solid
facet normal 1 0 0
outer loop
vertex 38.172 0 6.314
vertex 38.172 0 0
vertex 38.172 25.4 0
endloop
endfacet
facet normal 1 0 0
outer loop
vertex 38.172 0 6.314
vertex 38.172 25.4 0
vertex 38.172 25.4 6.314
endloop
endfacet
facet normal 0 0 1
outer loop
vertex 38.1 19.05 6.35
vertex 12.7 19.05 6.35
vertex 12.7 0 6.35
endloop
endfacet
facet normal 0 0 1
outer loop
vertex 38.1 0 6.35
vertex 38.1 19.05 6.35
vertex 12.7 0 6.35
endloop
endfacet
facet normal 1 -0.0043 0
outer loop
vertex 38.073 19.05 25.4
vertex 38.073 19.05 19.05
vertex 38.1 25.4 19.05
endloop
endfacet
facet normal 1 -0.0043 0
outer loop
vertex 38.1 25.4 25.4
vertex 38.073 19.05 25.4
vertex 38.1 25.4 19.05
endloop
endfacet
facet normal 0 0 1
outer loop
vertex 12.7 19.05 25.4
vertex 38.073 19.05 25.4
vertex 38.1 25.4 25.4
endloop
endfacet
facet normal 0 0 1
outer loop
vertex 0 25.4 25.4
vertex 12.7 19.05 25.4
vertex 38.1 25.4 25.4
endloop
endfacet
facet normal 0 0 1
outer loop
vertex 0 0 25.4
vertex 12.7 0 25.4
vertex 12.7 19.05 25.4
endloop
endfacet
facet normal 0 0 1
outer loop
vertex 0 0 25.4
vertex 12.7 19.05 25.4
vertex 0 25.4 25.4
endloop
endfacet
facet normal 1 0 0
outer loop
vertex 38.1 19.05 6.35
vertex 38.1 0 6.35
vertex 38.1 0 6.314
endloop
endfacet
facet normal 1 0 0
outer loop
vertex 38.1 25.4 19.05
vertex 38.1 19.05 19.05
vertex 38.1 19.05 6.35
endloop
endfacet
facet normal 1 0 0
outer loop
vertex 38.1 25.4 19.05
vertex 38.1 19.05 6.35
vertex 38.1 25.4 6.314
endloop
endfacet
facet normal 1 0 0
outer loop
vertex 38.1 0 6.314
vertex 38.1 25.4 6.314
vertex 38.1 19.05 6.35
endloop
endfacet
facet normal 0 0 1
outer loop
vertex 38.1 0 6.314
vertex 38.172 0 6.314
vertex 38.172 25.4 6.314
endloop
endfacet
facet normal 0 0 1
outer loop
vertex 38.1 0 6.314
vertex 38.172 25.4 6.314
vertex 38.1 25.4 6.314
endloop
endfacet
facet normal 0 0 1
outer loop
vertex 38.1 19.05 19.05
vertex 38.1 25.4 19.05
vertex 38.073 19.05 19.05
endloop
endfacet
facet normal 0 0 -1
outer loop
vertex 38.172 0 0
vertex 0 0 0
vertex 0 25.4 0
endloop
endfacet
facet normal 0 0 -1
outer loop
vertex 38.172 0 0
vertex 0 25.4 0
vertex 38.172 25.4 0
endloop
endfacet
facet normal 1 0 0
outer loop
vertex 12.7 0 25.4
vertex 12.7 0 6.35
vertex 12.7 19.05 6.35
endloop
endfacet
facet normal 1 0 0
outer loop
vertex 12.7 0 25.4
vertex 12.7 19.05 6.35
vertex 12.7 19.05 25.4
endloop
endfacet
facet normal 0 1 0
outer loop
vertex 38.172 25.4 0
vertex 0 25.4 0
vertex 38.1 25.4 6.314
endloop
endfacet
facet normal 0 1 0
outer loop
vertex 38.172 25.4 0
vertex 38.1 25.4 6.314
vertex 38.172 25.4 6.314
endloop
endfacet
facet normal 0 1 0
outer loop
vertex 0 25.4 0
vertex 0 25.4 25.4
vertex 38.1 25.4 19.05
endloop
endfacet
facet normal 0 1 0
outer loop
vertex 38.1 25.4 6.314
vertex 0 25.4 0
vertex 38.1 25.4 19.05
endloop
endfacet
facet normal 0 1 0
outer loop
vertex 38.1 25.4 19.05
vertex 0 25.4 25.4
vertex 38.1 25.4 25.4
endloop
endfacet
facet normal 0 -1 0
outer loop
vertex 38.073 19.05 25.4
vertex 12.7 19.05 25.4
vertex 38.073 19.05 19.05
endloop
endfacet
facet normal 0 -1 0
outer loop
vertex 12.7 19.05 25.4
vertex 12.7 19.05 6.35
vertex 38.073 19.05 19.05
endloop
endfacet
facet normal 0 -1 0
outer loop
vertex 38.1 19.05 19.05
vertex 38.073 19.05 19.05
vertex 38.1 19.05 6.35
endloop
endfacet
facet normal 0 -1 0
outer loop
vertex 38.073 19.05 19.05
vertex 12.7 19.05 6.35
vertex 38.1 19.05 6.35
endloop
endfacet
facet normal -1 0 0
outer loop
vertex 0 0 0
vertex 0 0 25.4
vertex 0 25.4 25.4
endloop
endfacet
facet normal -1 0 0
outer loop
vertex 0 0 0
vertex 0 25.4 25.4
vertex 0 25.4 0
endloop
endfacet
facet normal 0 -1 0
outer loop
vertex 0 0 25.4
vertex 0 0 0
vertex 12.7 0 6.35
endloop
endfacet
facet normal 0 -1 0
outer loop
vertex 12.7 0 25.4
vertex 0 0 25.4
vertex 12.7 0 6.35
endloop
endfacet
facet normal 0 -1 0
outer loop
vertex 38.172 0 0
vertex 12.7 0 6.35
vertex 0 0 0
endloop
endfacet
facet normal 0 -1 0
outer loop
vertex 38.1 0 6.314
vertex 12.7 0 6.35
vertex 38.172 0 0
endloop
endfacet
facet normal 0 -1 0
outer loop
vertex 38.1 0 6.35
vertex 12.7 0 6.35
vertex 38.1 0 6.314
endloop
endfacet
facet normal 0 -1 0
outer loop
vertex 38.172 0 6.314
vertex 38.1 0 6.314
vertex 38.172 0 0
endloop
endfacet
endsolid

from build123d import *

# Parameters (mm, degrees)
F3_DEPTH = 25.4
F4_DEPTH = 38.1
F5_DEPTH = 25.4


with BuildPart() as f3:
    # F0 (on Front) → F3 (new body)
    with BuildSketch(Plane.XZ):
        Polygon((0, 25.4), (0, 0), (38.171803, 0), (38.171803, 6.314098), (12.7, 6.314098), (12.7, 19.05), (12.7, 25.4), align=None)
    extrude(amount=-F3_DEPTH)

    # F1 (on Right) → F4 (join)
    with BuildSketch(Plane.YZ):
        Polygon((0, 6.35), (0, 0), (25.4, 0), (25.4, 19.05), (19.05, 19.05), (19.05, 6.35), align=None)
    extrude(amount=F4_DEPTH)

    # F2 (on Top) → F5 (join)
    with BuildSketch(Plane.XY):
        Polygon((0, 25.4), (0, 0), (12.673074, 0), (12.673074, 19.05), (38.073074, 19.05), (38.1, 25.4), align=None)
    extrude(amount=F5_DEPTH)


solid = f3.part
